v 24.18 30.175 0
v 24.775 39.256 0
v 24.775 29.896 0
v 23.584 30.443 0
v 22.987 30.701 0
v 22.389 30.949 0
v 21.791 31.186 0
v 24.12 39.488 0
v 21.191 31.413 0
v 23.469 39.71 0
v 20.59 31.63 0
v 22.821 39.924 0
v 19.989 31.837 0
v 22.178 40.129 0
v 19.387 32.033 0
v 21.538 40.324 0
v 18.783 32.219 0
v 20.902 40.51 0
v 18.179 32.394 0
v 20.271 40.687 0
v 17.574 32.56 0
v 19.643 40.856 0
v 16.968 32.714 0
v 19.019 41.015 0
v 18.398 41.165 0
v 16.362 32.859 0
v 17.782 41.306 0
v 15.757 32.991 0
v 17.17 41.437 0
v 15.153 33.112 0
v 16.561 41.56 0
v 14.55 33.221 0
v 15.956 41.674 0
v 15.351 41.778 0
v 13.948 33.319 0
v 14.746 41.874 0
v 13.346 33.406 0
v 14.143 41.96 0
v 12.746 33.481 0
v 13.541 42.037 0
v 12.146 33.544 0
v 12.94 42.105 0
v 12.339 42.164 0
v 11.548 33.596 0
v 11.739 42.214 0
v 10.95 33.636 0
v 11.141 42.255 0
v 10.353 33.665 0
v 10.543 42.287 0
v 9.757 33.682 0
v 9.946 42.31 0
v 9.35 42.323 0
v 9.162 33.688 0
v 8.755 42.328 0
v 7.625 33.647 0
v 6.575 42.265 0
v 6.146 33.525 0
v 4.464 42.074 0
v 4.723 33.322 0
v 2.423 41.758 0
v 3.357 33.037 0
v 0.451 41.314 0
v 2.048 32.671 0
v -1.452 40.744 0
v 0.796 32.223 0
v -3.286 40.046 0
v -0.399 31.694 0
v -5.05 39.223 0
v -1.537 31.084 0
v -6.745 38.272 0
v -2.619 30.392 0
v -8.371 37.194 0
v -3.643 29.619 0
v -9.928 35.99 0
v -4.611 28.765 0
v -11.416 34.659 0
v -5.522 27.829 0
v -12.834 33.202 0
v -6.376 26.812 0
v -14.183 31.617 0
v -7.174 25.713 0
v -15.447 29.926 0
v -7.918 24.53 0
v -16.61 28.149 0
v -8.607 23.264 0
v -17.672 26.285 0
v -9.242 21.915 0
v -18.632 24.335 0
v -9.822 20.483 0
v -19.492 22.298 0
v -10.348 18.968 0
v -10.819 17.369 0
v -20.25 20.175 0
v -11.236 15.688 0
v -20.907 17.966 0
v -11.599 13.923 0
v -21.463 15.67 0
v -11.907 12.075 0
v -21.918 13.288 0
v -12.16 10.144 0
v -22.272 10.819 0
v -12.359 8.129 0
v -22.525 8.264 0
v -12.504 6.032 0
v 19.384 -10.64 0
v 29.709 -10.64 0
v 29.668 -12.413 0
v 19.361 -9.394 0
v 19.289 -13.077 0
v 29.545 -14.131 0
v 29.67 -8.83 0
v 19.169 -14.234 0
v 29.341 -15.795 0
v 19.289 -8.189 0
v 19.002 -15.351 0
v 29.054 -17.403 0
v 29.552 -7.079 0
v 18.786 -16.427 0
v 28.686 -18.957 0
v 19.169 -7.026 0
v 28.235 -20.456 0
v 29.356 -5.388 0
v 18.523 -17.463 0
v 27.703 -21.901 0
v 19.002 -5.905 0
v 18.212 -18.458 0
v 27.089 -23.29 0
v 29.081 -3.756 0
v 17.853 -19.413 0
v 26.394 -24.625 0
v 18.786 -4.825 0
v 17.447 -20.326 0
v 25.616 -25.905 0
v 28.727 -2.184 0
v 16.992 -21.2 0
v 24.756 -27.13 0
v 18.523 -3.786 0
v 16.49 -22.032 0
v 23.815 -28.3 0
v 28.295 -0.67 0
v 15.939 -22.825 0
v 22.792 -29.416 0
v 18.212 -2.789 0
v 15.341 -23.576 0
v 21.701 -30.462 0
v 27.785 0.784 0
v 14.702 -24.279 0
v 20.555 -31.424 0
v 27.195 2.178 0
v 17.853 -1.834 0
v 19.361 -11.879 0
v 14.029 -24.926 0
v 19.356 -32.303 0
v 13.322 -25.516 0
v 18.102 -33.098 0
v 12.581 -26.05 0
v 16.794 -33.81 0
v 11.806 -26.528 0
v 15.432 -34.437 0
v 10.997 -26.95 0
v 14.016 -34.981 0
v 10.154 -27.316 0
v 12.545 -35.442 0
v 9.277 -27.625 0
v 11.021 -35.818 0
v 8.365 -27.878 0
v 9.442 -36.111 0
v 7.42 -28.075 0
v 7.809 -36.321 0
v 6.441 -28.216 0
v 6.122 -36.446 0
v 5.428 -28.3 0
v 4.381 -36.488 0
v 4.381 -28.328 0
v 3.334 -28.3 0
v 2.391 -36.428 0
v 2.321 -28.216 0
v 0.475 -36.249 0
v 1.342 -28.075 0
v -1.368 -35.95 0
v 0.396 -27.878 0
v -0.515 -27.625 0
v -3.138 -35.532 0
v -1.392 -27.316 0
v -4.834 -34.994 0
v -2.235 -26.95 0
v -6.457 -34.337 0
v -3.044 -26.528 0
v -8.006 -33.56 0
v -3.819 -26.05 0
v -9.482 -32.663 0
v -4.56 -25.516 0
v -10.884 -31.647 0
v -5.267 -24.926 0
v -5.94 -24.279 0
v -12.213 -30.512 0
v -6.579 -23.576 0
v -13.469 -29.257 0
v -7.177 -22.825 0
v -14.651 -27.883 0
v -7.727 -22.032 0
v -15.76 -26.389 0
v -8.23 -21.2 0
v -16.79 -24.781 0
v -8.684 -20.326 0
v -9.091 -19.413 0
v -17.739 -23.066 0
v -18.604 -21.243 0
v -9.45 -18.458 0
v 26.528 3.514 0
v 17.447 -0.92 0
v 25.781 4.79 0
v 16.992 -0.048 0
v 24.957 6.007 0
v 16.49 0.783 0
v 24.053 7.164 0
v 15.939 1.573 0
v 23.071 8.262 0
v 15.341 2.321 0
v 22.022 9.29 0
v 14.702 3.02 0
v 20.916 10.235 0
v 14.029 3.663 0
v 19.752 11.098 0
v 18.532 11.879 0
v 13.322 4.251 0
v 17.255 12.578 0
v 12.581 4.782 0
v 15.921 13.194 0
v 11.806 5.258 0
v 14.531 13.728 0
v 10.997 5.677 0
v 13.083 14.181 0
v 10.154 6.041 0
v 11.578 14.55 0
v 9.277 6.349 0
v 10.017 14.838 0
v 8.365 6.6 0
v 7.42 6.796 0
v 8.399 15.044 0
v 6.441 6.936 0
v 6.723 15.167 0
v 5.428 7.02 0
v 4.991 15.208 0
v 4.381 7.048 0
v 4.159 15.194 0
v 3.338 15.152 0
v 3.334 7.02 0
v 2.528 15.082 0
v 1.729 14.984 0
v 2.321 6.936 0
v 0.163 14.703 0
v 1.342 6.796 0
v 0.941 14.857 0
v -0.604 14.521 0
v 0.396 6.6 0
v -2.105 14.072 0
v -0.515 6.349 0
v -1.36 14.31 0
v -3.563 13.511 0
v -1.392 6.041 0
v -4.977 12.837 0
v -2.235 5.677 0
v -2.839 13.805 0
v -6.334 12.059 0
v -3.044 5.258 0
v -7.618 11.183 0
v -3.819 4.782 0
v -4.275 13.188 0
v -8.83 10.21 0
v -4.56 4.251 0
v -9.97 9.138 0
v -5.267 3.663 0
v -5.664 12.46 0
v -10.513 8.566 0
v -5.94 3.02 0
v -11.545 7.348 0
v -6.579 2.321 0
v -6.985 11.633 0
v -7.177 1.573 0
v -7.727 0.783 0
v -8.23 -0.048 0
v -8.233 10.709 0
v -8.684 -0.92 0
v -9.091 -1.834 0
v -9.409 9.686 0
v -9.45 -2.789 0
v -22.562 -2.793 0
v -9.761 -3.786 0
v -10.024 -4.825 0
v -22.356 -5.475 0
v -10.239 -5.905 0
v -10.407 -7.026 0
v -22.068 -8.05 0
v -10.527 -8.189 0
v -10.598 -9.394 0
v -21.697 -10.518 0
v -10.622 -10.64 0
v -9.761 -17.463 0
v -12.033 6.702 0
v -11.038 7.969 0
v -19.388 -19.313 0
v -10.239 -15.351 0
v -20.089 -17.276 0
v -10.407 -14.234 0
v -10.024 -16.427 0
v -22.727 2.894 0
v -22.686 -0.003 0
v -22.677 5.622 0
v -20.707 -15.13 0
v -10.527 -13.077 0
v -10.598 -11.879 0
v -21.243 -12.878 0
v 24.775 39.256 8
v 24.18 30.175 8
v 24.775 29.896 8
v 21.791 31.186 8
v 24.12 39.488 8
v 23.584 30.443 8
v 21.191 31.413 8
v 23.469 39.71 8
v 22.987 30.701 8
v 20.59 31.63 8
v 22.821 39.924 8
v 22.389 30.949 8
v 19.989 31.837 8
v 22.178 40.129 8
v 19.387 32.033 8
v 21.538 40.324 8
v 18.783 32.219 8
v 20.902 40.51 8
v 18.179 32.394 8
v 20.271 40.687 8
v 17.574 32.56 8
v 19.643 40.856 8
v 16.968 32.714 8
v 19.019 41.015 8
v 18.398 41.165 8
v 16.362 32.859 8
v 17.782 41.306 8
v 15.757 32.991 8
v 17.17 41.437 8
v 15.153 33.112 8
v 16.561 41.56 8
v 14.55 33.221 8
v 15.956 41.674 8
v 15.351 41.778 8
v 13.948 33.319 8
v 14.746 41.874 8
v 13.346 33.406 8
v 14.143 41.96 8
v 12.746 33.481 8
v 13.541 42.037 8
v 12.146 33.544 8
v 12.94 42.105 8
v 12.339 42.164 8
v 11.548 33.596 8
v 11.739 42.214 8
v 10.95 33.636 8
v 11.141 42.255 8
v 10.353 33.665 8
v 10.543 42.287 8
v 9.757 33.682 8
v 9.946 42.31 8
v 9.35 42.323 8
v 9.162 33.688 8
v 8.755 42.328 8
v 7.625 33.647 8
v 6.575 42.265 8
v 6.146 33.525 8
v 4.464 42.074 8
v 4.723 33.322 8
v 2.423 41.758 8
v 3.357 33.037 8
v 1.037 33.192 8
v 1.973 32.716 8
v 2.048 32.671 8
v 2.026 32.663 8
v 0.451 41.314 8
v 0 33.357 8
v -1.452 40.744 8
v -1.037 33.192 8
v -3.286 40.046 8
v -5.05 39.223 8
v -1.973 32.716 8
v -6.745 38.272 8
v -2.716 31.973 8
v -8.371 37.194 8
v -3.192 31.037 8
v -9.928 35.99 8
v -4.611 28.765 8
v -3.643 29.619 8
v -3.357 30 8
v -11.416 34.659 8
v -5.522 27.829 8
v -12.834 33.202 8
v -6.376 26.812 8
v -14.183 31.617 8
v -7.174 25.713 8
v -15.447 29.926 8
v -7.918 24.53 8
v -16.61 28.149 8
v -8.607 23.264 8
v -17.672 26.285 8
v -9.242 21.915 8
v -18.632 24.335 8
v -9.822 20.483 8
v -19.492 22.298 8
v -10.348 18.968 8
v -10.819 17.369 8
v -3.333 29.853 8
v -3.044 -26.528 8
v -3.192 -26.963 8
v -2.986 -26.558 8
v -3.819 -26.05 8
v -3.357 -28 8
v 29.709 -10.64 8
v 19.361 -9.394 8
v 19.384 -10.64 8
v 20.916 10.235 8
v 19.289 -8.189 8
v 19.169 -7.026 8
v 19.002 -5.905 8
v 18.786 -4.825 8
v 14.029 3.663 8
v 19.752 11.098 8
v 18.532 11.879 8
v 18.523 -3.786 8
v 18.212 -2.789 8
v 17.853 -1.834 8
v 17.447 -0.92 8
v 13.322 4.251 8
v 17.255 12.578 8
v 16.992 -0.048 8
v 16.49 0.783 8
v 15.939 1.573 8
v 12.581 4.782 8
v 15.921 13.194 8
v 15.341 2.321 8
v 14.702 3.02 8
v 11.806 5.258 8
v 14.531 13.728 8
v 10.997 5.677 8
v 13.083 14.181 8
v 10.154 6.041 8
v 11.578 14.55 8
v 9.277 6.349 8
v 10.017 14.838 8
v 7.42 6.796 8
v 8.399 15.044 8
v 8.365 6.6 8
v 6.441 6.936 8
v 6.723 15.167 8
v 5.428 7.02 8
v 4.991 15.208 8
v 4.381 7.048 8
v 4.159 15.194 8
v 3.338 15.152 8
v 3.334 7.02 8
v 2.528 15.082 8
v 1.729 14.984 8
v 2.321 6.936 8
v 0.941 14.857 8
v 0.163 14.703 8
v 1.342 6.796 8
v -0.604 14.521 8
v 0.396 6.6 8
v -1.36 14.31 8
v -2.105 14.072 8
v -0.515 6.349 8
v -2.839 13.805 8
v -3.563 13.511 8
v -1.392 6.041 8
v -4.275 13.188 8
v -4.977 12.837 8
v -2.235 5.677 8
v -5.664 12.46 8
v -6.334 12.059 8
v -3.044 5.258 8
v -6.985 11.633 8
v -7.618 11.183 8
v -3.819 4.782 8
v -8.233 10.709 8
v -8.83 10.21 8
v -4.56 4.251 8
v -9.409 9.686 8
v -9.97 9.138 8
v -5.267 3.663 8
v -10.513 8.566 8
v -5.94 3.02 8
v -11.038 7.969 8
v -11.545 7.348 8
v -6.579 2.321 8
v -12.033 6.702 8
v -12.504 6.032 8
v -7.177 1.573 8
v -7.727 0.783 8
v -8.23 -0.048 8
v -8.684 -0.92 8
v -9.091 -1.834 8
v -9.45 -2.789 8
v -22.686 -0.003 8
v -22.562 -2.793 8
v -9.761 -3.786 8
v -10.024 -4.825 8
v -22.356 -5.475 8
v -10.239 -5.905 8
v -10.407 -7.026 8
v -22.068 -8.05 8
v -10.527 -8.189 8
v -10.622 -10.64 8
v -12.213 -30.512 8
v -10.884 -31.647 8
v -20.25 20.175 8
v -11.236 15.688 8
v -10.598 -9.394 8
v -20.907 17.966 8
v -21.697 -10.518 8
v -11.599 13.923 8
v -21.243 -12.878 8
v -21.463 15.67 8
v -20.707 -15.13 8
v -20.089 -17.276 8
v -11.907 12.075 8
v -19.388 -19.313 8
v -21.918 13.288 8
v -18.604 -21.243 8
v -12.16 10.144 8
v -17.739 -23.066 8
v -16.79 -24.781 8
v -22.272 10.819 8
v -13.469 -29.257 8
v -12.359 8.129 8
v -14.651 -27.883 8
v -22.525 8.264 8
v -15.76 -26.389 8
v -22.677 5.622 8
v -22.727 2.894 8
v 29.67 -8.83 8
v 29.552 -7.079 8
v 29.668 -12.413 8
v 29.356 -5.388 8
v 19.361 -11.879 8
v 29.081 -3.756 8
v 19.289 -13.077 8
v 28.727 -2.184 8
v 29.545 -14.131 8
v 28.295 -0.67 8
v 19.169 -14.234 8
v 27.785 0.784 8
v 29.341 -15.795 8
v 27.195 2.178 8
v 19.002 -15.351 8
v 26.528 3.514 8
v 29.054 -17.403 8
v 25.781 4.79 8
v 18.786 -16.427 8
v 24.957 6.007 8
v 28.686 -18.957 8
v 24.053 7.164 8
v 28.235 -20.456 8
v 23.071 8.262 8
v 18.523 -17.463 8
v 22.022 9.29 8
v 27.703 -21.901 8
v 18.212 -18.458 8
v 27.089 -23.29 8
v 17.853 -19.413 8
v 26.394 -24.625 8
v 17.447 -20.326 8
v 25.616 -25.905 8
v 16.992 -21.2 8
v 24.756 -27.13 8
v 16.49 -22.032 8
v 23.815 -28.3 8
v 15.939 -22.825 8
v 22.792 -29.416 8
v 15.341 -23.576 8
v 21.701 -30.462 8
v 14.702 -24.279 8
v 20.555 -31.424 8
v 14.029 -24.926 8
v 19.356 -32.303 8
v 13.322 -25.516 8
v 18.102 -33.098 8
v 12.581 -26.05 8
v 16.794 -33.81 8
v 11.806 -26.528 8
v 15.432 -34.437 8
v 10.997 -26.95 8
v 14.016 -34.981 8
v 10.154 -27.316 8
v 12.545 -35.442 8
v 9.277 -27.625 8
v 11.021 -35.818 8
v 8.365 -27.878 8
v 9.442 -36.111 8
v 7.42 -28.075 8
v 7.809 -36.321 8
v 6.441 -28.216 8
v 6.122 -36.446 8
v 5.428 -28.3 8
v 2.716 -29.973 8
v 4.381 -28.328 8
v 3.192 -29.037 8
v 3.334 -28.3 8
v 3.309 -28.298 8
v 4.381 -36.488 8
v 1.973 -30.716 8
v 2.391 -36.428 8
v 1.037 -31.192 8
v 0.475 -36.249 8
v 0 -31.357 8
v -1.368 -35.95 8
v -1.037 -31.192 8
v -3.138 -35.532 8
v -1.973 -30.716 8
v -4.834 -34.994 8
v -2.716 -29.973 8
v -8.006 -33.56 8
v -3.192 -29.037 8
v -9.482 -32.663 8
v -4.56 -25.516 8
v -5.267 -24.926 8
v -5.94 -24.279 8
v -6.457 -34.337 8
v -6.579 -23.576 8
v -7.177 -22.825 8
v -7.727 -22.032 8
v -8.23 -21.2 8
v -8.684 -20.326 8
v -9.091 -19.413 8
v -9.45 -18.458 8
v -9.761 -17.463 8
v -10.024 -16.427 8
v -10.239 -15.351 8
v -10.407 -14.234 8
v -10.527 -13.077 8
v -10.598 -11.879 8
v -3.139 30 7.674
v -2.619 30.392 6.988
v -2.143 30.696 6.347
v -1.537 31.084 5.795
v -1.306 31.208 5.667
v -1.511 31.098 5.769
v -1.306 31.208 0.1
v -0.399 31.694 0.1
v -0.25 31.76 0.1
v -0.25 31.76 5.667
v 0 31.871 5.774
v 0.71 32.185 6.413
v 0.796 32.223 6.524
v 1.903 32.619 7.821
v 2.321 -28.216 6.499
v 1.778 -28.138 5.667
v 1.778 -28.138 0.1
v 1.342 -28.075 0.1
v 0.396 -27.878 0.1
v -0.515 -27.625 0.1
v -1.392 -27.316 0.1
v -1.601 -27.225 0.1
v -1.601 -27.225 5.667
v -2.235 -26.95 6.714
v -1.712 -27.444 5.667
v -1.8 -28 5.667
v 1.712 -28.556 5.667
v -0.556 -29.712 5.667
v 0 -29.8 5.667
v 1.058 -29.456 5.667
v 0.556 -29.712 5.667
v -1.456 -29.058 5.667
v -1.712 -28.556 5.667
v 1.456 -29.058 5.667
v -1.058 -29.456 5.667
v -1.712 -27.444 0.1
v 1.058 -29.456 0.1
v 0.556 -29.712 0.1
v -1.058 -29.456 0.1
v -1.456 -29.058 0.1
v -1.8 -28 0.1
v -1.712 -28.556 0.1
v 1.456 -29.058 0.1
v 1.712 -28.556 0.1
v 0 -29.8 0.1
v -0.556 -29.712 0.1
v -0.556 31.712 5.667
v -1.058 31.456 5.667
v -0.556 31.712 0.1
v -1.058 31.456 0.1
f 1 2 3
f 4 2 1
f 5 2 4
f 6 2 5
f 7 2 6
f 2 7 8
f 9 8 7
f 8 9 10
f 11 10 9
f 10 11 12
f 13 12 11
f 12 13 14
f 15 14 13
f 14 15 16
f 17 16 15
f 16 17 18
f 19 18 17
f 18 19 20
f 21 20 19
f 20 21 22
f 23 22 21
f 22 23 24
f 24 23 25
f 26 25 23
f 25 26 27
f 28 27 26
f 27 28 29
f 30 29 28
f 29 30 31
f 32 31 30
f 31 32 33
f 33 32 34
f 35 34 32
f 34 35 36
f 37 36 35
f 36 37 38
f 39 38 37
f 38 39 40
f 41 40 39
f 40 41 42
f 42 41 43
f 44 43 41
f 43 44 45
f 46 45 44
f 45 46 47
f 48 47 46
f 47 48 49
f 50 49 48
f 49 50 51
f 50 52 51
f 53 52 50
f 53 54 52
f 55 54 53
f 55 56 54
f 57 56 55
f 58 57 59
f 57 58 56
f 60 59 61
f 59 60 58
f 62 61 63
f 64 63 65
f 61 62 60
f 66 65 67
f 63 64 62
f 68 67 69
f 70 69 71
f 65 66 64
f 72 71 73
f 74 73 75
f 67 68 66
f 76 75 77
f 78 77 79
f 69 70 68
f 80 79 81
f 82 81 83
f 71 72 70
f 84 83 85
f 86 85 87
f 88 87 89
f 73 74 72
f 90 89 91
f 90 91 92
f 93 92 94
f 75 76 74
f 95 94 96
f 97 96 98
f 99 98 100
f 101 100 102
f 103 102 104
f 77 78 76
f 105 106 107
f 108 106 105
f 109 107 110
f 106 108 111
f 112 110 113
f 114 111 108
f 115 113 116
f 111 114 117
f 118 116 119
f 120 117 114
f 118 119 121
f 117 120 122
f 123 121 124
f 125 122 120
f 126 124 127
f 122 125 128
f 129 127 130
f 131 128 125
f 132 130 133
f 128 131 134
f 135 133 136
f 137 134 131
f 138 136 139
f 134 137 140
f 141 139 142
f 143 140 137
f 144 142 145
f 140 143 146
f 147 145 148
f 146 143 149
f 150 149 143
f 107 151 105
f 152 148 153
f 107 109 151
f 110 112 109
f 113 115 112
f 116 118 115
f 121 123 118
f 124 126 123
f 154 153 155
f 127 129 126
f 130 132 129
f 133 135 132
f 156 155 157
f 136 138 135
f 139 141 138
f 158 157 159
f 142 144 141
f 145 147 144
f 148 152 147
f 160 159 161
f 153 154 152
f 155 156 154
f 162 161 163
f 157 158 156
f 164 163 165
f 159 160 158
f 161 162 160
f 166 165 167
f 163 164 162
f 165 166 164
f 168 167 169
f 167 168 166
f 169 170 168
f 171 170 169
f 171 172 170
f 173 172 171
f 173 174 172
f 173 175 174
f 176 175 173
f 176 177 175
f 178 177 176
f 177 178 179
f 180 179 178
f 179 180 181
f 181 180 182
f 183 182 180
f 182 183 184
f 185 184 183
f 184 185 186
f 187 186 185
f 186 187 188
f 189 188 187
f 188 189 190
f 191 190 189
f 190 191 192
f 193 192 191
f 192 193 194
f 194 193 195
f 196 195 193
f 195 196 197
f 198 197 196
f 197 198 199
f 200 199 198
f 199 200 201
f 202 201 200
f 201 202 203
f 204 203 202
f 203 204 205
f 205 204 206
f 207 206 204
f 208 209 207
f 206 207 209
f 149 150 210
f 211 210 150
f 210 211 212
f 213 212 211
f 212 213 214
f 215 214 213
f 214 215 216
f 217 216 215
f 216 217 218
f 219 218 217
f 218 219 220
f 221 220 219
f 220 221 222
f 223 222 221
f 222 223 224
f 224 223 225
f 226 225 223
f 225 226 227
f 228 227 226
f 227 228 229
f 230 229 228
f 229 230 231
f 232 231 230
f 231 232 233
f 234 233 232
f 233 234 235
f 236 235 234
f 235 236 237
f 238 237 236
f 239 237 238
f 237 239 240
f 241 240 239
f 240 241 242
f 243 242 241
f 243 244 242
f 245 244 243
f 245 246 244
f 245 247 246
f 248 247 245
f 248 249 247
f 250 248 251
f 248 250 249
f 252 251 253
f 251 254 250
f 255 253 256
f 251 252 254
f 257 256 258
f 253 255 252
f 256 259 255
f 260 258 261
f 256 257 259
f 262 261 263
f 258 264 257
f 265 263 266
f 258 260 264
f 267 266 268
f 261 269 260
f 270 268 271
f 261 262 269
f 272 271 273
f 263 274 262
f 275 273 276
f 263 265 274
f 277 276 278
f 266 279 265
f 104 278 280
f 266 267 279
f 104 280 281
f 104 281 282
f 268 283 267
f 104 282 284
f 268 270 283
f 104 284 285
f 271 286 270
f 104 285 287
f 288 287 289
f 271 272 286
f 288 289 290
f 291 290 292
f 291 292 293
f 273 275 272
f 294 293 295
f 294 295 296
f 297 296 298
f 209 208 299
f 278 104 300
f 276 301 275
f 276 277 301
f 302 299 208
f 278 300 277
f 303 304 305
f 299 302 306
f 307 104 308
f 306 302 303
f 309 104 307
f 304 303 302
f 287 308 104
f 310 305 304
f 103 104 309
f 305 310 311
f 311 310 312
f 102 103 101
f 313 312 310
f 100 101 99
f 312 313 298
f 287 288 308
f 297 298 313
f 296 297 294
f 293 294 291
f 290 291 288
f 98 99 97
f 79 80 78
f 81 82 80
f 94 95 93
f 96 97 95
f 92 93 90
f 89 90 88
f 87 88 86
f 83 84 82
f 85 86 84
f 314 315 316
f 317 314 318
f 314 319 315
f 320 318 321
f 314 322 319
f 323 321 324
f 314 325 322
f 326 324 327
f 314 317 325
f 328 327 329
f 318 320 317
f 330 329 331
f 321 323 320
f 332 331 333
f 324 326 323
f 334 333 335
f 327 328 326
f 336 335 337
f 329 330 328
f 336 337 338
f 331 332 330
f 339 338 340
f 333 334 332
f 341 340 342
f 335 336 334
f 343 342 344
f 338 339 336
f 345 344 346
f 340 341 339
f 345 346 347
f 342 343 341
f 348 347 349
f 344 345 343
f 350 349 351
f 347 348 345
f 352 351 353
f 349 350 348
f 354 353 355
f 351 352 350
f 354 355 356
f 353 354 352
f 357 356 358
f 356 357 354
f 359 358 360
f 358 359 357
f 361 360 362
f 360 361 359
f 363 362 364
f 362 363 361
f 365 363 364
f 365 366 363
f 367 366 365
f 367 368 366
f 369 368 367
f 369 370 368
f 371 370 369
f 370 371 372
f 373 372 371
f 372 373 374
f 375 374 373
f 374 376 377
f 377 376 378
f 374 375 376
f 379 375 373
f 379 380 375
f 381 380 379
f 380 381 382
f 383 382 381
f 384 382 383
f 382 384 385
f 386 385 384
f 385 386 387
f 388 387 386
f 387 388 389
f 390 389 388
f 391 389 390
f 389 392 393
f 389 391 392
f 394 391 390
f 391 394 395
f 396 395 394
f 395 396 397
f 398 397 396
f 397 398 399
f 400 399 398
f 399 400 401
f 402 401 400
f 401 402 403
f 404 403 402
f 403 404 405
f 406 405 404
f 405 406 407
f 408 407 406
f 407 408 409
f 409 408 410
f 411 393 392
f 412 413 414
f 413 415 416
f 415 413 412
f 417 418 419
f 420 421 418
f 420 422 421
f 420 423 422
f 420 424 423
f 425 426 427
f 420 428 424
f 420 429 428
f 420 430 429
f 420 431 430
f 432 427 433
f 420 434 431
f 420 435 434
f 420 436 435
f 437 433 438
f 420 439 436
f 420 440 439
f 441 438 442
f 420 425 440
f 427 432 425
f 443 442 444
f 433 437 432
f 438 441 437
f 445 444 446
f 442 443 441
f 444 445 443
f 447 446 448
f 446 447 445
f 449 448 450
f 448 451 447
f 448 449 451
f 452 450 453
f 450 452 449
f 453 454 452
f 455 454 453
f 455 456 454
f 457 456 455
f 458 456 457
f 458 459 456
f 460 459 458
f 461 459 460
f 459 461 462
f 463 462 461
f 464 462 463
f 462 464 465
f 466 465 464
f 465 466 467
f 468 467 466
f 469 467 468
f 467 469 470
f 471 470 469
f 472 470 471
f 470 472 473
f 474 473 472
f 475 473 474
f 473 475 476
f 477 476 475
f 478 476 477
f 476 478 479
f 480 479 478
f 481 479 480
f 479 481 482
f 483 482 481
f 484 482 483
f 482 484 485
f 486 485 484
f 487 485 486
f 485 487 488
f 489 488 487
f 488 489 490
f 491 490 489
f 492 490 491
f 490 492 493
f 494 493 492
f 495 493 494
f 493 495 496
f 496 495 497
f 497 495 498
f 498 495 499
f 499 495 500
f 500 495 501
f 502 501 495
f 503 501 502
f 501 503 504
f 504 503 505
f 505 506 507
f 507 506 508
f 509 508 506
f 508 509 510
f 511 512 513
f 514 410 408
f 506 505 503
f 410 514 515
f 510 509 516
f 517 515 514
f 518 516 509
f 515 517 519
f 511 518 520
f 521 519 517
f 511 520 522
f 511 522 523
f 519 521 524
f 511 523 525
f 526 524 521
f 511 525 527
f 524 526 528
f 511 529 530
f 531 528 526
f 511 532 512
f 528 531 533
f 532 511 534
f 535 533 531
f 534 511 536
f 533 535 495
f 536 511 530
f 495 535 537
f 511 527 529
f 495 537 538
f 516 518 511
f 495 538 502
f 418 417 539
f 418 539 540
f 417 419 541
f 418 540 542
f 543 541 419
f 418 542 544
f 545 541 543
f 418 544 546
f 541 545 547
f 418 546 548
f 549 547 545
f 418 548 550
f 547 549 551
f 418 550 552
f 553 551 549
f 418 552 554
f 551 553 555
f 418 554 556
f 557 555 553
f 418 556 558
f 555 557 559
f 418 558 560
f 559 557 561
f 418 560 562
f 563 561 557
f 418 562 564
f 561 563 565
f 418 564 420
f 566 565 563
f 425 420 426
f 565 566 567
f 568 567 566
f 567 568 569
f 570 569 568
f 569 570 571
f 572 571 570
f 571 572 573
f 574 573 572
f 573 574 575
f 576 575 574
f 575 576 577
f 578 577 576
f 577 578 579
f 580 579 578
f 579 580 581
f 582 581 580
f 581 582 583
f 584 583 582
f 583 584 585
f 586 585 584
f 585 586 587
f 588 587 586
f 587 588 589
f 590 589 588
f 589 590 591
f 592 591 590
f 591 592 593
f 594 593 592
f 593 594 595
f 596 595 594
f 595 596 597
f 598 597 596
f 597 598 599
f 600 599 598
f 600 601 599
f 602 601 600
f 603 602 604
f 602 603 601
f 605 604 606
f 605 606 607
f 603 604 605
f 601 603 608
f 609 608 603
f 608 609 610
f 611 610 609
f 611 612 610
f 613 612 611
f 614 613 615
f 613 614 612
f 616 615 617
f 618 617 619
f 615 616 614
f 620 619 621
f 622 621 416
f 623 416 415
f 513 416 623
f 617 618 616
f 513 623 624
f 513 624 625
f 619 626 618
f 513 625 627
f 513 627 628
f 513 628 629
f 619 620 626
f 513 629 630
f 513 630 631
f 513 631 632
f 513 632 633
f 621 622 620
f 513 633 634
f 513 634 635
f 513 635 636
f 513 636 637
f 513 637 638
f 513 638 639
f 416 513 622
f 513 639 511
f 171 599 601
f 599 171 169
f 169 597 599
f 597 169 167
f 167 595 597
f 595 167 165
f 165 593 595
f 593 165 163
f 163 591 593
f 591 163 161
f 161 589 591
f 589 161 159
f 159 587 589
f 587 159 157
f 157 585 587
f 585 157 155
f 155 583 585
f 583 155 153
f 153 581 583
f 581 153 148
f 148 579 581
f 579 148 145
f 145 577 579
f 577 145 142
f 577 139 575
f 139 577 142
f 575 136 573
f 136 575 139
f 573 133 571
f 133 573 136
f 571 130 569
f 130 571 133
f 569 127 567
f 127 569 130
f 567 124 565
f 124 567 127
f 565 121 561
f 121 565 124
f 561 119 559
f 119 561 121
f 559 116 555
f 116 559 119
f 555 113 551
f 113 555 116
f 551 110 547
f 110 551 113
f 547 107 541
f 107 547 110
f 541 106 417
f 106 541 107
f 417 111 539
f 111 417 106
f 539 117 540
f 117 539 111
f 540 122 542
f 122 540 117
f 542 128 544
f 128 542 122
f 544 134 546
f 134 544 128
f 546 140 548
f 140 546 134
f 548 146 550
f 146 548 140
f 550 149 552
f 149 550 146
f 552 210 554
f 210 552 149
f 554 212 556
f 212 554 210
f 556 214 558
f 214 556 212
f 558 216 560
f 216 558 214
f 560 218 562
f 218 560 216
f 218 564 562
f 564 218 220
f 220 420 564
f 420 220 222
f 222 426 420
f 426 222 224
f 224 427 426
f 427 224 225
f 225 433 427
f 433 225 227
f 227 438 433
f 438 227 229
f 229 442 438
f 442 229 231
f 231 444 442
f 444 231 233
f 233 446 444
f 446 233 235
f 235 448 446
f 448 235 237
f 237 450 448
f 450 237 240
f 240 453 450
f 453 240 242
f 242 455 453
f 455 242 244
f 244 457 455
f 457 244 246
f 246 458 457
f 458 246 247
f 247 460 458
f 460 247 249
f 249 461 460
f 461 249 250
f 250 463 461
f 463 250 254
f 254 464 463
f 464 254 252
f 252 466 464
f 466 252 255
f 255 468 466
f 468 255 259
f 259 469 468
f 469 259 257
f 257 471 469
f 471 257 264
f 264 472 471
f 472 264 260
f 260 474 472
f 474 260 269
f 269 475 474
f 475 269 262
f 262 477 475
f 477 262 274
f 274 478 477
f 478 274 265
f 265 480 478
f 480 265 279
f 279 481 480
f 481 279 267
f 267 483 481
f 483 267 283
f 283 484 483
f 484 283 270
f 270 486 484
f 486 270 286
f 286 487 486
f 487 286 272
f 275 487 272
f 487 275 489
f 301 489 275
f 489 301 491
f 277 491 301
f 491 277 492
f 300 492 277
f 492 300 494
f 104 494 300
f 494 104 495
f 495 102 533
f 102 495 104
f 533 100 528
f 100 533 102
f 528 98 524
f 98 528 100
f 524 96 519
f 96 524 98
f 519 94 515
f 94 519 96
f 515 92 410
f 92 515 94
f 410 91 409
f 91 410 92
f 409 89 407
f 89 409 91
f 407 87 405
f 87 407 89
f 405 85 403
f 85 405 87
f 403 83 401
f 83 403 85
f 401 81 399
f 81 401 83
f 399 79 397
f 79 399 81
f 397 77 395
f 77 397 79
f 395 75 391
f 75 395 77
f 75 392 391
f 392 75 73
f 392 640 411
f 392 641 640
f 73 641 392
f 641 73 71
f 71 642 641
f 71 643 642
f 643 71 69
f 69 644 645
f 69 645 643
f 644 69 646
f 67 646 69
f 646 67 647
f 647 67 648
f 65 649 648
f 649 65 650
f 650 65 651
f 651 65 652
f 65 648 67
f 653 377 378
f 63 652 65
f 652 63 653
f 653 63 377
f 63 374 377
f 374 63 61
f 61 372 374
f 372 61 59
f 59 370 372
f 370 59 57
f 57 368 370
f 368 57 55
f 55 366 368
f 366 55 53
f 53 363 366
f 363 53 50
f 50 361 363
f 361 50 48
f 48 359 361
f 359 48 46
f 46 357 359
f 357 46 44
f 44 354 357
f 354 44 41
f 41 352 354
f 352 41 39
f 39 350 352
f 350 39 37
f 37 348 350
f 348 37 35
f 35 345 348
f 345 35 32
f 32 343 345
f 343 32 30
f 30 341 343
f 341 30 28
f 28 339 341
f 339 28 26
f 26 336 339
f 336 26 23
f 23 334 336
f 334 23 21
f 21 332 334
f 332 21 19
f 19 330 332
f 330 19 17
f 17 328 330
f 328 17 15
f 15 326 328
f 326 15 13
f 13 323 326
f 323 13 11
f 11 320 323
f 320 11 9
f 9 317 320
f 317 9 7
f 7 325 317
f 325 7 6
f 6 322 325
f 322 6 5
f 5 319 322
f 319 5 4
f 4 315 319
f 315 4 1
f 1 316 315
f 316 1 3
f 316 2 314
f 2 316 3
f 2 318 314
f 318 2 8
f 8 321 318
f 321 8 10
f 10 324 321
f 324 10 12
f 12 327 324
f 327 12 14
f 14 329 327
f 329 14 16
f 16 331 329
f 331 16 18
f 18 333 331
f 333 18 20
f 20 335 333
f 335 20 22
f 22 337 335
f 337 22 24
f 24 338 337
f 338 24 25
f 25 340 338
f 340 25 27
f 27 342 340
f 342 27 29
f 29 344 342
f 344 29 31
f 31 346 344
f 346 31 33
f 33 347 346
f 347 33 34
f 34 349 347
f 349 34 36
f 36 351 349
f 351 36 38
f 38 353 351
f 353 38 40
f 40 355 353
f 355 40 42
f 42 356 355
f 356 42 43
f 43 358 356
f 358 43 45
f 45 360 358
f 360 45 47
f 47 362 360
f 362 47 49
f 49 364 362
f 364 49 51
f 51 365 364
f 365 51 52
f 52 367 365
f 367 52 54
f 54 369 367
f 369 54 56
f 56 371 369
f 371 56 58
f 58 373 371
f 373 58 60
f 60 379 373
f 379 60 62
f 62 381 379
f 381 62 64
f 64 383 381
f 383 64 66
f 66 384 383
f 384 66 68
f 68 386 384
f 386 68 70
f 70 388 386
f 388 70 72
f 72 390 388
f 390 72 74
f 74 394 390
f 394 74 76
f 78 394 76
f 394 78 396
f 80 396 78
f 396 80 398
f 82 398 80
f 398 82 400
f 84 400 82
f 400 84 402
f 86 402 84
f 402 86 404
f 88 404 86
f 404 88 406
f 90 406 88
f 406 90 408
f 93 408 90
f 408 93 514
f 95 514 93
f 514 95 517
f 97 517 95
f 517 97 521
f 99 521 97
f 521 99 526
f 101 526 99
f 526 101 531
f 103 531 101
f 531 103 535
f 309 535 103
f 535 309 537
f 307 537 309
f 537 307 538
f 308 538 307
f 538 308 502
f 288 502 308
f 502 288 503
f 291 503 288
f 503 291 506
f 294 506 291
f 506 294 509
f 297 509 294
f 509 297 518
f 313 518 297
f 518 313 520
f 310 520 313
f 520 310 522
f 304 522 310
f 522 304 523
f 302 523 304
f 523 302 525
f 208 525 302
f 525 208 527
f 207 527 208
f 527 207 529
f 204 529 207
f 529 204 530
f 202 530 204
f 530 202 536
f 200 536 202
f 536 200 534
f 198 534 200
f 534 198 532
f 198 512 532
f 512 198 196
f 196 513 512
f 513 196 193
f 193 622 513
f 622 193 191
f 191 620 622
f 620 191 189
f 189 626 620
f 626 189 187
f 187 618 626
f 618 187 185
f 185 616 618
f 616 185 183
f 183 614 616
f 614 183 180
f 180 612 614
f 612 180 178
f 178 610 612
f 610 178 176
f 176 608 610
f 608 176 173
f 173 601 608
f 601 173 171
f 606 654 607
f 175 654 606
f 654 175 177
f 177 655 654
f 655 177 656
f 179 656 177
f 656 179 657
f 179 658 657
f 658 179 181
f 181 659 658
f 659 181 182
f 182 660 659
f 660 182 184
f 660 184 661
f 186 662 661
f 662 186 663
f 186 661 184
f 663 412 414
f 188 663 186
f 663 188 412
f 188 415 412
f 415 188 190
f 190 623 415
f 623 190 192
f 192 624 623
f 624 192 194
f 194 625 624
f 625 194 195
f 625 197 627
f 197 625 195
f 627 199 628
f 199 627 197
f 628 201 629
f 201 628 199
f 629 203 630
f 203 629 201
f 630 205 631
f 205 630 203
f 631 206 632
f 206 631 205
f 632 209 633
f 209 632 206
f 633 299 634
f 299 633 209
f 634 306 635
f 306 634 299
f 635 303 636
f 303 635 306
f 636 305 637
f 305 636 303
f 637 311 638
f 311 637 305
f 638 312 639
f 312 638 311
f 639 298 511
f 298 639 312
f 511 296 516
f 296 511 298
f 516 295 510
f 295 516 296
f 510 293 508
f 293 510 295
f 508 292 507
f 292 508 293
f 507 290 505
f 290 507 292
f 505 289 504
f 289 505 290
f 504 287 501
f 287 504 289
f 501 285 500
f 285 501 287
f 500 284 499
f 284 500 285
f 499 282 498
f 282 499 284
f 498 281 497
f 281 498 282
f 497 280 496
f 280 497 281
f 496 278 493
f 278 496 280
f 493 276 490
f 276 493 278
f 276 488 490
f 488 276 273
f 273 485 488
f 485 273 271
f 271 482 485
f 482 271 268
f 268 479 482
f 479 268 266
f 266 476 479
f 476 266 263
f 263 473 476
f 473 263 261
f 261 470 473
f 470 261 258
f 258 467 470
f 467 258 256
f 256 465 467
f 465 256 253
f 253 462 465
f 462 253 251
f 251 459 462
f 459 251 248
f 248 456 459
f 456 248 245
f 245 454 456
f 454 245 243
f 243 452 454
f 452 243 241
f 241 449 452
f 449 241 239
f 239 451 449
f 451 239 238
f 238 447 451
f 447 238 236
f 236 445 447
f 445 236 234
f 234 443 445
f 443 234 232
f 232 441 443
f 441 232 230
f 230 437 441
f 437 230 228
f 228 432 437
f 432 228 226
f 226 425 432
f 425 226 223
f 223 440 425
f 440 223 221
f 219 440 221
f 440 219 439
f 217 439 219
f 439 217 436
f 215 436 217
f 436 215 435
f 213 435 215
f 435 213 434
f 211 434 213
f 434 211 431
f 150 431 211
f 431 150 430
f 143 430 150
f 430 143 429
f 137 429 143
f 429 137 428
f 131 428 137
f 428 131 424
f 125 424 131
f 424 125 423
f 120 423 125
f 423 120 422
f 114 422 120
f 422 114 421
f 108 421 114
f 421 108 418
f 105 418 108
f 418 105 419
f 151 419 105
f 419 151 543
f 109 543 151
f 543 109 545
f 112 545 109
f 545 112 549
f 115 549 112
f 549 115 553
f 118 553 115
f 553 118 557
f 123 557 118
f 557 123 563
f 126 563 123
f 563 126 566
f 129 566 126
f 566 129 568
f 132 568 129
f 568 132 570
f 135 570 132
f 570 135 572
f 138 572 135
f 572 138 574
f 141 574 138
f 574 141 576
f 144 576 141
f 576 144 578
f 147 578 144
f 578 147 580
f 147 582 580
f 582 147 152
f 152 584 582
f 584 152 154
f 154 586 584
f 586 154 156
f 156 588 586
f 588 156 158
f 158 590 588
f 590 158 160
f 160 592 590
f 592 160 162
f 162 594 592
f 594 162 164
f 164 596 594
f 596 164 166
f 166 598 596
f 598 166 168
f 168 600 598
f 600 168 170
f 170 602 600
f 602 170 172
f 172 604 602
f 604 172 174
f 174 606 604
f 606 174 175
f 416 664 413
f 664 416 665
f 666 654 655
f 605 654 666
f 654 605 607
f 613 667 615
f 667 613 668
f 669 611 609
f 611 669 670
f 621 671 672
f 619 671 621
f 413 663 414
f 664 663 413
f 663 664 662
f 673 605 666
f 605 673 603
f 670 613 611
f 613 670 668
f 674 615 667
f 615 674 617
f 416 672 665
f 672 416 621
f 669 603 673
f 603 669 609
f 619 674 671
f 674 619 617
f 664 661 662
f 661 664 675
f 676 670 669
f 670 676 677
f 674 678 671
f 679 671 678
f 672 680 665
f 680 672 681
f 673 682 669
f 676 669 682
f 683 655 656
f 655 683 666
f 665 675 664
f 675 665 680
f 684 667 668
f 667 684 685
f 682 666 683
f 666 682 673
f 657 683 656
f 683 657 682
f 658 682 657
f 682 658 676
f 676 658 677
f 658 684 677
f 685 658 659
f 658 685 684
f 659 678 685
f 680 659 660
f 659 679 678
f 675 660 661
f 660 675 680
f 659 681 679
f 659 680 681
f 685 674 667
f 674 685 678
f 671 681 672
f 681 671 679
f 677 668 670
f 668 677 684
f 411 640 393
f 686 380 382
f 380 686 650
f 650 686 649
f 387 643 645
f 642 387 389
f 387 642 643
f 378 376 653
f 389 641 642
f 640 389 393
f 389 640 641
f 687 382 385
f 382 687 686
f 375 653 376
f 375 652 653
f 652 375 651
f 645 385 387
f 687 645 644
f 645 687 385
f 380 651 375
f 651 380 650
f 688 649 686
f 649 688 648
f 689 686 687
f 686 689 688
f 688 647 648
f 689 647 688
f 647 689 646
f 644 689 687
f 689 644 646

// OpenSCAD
// Street Numbers for 3D printing
// Charles Tilford, 2019
// License: CC BY-NC-SA 4.0
//   https://creativecommons.org/licenses/by-nc-sa/4.0/

char="6";     // The number/letter to print

// Units are in mm, except for height of letter

// How many inches high should letter be?
inchesHigh=3;
// How thick/deep should letter be (mm)?
depth=8;

// Character coordinates just center the letter
charX=-30;    // Character X coord
charY=-35;    // Character Y coord
topScrew=30;  // Top screw Y coord
botScrew=-28; // Bottom screw Y coord
height=8;     // Thickness of character
// Screw dimensions. Default presumes
// #6 sheet metal screw
screwWid=3.6; // Width of screw shaft
screwTop=6.78;// Width of screw head
screwCon=5.08;// Height of head 'cone'

// Font to print in. Your system needs this
// installed, of course. If changed the hole
// positions almost certainly need to be
// changed, and maybe charX/charY.
fName="Open Sans Extrabold";
// https://fonts.google.com/specimen/Open+Sans
// Designer: Steve Matteson

// Thin floor below holes. My printer was
// struggling to have the hole 'border' stick
// to the stage. Just drill/screw thru it.
holeFloor=0.1; 

// ==========================================
// ===== All values below are auto-calculated
// ==========================================

// Scaled values
scaleFactor=inchesHigh / 3;
cX=charX * scaleFactor;
cY=charY * scaleFactor;
tS=topScrew * scaleFactor;
bS=botScrew * scaleFactor;
// Where do we start drawing screw head cone?
oS=depth - (screwCon-.05);

difference() {
  // We use difference() to punch out the screw holes
  // in the character
    
  // The character itself, 8mm thick
  translate([cX,cY,0])
    linear_extrude(height=depth, scale=1)
    text(char, size=(75*scaleFactor),
         $fn=100, font=fName);
    
  // Bottom screw hole
  translate([0,bS,oS]) color("red")
    cylinder(h=screwCon, d2=screwTop,
             d1=0, $fn=20);
   translate([0,bS,holeFloor])
    cylinder(h=20, d=screwWid, $fn=20);
    
  // Top screw hole
  translate([0,tS,oS]) color("red")
    cylinder(h=screwCon, d2=screwTop,
             d1=0, $fn=20);
  translate([0,tS,holeFloor])
    cylinder(h=20, d=screwWid, $fn=20);
}

// Colors are just to aid visualization of
// void spaces. $fn is "featuer number", ie how
// many polygons are devoted to object. The values
// above should be near your printing limit anyway.

// Developed in OpenSCAD
//    https://www.openscad.org/
